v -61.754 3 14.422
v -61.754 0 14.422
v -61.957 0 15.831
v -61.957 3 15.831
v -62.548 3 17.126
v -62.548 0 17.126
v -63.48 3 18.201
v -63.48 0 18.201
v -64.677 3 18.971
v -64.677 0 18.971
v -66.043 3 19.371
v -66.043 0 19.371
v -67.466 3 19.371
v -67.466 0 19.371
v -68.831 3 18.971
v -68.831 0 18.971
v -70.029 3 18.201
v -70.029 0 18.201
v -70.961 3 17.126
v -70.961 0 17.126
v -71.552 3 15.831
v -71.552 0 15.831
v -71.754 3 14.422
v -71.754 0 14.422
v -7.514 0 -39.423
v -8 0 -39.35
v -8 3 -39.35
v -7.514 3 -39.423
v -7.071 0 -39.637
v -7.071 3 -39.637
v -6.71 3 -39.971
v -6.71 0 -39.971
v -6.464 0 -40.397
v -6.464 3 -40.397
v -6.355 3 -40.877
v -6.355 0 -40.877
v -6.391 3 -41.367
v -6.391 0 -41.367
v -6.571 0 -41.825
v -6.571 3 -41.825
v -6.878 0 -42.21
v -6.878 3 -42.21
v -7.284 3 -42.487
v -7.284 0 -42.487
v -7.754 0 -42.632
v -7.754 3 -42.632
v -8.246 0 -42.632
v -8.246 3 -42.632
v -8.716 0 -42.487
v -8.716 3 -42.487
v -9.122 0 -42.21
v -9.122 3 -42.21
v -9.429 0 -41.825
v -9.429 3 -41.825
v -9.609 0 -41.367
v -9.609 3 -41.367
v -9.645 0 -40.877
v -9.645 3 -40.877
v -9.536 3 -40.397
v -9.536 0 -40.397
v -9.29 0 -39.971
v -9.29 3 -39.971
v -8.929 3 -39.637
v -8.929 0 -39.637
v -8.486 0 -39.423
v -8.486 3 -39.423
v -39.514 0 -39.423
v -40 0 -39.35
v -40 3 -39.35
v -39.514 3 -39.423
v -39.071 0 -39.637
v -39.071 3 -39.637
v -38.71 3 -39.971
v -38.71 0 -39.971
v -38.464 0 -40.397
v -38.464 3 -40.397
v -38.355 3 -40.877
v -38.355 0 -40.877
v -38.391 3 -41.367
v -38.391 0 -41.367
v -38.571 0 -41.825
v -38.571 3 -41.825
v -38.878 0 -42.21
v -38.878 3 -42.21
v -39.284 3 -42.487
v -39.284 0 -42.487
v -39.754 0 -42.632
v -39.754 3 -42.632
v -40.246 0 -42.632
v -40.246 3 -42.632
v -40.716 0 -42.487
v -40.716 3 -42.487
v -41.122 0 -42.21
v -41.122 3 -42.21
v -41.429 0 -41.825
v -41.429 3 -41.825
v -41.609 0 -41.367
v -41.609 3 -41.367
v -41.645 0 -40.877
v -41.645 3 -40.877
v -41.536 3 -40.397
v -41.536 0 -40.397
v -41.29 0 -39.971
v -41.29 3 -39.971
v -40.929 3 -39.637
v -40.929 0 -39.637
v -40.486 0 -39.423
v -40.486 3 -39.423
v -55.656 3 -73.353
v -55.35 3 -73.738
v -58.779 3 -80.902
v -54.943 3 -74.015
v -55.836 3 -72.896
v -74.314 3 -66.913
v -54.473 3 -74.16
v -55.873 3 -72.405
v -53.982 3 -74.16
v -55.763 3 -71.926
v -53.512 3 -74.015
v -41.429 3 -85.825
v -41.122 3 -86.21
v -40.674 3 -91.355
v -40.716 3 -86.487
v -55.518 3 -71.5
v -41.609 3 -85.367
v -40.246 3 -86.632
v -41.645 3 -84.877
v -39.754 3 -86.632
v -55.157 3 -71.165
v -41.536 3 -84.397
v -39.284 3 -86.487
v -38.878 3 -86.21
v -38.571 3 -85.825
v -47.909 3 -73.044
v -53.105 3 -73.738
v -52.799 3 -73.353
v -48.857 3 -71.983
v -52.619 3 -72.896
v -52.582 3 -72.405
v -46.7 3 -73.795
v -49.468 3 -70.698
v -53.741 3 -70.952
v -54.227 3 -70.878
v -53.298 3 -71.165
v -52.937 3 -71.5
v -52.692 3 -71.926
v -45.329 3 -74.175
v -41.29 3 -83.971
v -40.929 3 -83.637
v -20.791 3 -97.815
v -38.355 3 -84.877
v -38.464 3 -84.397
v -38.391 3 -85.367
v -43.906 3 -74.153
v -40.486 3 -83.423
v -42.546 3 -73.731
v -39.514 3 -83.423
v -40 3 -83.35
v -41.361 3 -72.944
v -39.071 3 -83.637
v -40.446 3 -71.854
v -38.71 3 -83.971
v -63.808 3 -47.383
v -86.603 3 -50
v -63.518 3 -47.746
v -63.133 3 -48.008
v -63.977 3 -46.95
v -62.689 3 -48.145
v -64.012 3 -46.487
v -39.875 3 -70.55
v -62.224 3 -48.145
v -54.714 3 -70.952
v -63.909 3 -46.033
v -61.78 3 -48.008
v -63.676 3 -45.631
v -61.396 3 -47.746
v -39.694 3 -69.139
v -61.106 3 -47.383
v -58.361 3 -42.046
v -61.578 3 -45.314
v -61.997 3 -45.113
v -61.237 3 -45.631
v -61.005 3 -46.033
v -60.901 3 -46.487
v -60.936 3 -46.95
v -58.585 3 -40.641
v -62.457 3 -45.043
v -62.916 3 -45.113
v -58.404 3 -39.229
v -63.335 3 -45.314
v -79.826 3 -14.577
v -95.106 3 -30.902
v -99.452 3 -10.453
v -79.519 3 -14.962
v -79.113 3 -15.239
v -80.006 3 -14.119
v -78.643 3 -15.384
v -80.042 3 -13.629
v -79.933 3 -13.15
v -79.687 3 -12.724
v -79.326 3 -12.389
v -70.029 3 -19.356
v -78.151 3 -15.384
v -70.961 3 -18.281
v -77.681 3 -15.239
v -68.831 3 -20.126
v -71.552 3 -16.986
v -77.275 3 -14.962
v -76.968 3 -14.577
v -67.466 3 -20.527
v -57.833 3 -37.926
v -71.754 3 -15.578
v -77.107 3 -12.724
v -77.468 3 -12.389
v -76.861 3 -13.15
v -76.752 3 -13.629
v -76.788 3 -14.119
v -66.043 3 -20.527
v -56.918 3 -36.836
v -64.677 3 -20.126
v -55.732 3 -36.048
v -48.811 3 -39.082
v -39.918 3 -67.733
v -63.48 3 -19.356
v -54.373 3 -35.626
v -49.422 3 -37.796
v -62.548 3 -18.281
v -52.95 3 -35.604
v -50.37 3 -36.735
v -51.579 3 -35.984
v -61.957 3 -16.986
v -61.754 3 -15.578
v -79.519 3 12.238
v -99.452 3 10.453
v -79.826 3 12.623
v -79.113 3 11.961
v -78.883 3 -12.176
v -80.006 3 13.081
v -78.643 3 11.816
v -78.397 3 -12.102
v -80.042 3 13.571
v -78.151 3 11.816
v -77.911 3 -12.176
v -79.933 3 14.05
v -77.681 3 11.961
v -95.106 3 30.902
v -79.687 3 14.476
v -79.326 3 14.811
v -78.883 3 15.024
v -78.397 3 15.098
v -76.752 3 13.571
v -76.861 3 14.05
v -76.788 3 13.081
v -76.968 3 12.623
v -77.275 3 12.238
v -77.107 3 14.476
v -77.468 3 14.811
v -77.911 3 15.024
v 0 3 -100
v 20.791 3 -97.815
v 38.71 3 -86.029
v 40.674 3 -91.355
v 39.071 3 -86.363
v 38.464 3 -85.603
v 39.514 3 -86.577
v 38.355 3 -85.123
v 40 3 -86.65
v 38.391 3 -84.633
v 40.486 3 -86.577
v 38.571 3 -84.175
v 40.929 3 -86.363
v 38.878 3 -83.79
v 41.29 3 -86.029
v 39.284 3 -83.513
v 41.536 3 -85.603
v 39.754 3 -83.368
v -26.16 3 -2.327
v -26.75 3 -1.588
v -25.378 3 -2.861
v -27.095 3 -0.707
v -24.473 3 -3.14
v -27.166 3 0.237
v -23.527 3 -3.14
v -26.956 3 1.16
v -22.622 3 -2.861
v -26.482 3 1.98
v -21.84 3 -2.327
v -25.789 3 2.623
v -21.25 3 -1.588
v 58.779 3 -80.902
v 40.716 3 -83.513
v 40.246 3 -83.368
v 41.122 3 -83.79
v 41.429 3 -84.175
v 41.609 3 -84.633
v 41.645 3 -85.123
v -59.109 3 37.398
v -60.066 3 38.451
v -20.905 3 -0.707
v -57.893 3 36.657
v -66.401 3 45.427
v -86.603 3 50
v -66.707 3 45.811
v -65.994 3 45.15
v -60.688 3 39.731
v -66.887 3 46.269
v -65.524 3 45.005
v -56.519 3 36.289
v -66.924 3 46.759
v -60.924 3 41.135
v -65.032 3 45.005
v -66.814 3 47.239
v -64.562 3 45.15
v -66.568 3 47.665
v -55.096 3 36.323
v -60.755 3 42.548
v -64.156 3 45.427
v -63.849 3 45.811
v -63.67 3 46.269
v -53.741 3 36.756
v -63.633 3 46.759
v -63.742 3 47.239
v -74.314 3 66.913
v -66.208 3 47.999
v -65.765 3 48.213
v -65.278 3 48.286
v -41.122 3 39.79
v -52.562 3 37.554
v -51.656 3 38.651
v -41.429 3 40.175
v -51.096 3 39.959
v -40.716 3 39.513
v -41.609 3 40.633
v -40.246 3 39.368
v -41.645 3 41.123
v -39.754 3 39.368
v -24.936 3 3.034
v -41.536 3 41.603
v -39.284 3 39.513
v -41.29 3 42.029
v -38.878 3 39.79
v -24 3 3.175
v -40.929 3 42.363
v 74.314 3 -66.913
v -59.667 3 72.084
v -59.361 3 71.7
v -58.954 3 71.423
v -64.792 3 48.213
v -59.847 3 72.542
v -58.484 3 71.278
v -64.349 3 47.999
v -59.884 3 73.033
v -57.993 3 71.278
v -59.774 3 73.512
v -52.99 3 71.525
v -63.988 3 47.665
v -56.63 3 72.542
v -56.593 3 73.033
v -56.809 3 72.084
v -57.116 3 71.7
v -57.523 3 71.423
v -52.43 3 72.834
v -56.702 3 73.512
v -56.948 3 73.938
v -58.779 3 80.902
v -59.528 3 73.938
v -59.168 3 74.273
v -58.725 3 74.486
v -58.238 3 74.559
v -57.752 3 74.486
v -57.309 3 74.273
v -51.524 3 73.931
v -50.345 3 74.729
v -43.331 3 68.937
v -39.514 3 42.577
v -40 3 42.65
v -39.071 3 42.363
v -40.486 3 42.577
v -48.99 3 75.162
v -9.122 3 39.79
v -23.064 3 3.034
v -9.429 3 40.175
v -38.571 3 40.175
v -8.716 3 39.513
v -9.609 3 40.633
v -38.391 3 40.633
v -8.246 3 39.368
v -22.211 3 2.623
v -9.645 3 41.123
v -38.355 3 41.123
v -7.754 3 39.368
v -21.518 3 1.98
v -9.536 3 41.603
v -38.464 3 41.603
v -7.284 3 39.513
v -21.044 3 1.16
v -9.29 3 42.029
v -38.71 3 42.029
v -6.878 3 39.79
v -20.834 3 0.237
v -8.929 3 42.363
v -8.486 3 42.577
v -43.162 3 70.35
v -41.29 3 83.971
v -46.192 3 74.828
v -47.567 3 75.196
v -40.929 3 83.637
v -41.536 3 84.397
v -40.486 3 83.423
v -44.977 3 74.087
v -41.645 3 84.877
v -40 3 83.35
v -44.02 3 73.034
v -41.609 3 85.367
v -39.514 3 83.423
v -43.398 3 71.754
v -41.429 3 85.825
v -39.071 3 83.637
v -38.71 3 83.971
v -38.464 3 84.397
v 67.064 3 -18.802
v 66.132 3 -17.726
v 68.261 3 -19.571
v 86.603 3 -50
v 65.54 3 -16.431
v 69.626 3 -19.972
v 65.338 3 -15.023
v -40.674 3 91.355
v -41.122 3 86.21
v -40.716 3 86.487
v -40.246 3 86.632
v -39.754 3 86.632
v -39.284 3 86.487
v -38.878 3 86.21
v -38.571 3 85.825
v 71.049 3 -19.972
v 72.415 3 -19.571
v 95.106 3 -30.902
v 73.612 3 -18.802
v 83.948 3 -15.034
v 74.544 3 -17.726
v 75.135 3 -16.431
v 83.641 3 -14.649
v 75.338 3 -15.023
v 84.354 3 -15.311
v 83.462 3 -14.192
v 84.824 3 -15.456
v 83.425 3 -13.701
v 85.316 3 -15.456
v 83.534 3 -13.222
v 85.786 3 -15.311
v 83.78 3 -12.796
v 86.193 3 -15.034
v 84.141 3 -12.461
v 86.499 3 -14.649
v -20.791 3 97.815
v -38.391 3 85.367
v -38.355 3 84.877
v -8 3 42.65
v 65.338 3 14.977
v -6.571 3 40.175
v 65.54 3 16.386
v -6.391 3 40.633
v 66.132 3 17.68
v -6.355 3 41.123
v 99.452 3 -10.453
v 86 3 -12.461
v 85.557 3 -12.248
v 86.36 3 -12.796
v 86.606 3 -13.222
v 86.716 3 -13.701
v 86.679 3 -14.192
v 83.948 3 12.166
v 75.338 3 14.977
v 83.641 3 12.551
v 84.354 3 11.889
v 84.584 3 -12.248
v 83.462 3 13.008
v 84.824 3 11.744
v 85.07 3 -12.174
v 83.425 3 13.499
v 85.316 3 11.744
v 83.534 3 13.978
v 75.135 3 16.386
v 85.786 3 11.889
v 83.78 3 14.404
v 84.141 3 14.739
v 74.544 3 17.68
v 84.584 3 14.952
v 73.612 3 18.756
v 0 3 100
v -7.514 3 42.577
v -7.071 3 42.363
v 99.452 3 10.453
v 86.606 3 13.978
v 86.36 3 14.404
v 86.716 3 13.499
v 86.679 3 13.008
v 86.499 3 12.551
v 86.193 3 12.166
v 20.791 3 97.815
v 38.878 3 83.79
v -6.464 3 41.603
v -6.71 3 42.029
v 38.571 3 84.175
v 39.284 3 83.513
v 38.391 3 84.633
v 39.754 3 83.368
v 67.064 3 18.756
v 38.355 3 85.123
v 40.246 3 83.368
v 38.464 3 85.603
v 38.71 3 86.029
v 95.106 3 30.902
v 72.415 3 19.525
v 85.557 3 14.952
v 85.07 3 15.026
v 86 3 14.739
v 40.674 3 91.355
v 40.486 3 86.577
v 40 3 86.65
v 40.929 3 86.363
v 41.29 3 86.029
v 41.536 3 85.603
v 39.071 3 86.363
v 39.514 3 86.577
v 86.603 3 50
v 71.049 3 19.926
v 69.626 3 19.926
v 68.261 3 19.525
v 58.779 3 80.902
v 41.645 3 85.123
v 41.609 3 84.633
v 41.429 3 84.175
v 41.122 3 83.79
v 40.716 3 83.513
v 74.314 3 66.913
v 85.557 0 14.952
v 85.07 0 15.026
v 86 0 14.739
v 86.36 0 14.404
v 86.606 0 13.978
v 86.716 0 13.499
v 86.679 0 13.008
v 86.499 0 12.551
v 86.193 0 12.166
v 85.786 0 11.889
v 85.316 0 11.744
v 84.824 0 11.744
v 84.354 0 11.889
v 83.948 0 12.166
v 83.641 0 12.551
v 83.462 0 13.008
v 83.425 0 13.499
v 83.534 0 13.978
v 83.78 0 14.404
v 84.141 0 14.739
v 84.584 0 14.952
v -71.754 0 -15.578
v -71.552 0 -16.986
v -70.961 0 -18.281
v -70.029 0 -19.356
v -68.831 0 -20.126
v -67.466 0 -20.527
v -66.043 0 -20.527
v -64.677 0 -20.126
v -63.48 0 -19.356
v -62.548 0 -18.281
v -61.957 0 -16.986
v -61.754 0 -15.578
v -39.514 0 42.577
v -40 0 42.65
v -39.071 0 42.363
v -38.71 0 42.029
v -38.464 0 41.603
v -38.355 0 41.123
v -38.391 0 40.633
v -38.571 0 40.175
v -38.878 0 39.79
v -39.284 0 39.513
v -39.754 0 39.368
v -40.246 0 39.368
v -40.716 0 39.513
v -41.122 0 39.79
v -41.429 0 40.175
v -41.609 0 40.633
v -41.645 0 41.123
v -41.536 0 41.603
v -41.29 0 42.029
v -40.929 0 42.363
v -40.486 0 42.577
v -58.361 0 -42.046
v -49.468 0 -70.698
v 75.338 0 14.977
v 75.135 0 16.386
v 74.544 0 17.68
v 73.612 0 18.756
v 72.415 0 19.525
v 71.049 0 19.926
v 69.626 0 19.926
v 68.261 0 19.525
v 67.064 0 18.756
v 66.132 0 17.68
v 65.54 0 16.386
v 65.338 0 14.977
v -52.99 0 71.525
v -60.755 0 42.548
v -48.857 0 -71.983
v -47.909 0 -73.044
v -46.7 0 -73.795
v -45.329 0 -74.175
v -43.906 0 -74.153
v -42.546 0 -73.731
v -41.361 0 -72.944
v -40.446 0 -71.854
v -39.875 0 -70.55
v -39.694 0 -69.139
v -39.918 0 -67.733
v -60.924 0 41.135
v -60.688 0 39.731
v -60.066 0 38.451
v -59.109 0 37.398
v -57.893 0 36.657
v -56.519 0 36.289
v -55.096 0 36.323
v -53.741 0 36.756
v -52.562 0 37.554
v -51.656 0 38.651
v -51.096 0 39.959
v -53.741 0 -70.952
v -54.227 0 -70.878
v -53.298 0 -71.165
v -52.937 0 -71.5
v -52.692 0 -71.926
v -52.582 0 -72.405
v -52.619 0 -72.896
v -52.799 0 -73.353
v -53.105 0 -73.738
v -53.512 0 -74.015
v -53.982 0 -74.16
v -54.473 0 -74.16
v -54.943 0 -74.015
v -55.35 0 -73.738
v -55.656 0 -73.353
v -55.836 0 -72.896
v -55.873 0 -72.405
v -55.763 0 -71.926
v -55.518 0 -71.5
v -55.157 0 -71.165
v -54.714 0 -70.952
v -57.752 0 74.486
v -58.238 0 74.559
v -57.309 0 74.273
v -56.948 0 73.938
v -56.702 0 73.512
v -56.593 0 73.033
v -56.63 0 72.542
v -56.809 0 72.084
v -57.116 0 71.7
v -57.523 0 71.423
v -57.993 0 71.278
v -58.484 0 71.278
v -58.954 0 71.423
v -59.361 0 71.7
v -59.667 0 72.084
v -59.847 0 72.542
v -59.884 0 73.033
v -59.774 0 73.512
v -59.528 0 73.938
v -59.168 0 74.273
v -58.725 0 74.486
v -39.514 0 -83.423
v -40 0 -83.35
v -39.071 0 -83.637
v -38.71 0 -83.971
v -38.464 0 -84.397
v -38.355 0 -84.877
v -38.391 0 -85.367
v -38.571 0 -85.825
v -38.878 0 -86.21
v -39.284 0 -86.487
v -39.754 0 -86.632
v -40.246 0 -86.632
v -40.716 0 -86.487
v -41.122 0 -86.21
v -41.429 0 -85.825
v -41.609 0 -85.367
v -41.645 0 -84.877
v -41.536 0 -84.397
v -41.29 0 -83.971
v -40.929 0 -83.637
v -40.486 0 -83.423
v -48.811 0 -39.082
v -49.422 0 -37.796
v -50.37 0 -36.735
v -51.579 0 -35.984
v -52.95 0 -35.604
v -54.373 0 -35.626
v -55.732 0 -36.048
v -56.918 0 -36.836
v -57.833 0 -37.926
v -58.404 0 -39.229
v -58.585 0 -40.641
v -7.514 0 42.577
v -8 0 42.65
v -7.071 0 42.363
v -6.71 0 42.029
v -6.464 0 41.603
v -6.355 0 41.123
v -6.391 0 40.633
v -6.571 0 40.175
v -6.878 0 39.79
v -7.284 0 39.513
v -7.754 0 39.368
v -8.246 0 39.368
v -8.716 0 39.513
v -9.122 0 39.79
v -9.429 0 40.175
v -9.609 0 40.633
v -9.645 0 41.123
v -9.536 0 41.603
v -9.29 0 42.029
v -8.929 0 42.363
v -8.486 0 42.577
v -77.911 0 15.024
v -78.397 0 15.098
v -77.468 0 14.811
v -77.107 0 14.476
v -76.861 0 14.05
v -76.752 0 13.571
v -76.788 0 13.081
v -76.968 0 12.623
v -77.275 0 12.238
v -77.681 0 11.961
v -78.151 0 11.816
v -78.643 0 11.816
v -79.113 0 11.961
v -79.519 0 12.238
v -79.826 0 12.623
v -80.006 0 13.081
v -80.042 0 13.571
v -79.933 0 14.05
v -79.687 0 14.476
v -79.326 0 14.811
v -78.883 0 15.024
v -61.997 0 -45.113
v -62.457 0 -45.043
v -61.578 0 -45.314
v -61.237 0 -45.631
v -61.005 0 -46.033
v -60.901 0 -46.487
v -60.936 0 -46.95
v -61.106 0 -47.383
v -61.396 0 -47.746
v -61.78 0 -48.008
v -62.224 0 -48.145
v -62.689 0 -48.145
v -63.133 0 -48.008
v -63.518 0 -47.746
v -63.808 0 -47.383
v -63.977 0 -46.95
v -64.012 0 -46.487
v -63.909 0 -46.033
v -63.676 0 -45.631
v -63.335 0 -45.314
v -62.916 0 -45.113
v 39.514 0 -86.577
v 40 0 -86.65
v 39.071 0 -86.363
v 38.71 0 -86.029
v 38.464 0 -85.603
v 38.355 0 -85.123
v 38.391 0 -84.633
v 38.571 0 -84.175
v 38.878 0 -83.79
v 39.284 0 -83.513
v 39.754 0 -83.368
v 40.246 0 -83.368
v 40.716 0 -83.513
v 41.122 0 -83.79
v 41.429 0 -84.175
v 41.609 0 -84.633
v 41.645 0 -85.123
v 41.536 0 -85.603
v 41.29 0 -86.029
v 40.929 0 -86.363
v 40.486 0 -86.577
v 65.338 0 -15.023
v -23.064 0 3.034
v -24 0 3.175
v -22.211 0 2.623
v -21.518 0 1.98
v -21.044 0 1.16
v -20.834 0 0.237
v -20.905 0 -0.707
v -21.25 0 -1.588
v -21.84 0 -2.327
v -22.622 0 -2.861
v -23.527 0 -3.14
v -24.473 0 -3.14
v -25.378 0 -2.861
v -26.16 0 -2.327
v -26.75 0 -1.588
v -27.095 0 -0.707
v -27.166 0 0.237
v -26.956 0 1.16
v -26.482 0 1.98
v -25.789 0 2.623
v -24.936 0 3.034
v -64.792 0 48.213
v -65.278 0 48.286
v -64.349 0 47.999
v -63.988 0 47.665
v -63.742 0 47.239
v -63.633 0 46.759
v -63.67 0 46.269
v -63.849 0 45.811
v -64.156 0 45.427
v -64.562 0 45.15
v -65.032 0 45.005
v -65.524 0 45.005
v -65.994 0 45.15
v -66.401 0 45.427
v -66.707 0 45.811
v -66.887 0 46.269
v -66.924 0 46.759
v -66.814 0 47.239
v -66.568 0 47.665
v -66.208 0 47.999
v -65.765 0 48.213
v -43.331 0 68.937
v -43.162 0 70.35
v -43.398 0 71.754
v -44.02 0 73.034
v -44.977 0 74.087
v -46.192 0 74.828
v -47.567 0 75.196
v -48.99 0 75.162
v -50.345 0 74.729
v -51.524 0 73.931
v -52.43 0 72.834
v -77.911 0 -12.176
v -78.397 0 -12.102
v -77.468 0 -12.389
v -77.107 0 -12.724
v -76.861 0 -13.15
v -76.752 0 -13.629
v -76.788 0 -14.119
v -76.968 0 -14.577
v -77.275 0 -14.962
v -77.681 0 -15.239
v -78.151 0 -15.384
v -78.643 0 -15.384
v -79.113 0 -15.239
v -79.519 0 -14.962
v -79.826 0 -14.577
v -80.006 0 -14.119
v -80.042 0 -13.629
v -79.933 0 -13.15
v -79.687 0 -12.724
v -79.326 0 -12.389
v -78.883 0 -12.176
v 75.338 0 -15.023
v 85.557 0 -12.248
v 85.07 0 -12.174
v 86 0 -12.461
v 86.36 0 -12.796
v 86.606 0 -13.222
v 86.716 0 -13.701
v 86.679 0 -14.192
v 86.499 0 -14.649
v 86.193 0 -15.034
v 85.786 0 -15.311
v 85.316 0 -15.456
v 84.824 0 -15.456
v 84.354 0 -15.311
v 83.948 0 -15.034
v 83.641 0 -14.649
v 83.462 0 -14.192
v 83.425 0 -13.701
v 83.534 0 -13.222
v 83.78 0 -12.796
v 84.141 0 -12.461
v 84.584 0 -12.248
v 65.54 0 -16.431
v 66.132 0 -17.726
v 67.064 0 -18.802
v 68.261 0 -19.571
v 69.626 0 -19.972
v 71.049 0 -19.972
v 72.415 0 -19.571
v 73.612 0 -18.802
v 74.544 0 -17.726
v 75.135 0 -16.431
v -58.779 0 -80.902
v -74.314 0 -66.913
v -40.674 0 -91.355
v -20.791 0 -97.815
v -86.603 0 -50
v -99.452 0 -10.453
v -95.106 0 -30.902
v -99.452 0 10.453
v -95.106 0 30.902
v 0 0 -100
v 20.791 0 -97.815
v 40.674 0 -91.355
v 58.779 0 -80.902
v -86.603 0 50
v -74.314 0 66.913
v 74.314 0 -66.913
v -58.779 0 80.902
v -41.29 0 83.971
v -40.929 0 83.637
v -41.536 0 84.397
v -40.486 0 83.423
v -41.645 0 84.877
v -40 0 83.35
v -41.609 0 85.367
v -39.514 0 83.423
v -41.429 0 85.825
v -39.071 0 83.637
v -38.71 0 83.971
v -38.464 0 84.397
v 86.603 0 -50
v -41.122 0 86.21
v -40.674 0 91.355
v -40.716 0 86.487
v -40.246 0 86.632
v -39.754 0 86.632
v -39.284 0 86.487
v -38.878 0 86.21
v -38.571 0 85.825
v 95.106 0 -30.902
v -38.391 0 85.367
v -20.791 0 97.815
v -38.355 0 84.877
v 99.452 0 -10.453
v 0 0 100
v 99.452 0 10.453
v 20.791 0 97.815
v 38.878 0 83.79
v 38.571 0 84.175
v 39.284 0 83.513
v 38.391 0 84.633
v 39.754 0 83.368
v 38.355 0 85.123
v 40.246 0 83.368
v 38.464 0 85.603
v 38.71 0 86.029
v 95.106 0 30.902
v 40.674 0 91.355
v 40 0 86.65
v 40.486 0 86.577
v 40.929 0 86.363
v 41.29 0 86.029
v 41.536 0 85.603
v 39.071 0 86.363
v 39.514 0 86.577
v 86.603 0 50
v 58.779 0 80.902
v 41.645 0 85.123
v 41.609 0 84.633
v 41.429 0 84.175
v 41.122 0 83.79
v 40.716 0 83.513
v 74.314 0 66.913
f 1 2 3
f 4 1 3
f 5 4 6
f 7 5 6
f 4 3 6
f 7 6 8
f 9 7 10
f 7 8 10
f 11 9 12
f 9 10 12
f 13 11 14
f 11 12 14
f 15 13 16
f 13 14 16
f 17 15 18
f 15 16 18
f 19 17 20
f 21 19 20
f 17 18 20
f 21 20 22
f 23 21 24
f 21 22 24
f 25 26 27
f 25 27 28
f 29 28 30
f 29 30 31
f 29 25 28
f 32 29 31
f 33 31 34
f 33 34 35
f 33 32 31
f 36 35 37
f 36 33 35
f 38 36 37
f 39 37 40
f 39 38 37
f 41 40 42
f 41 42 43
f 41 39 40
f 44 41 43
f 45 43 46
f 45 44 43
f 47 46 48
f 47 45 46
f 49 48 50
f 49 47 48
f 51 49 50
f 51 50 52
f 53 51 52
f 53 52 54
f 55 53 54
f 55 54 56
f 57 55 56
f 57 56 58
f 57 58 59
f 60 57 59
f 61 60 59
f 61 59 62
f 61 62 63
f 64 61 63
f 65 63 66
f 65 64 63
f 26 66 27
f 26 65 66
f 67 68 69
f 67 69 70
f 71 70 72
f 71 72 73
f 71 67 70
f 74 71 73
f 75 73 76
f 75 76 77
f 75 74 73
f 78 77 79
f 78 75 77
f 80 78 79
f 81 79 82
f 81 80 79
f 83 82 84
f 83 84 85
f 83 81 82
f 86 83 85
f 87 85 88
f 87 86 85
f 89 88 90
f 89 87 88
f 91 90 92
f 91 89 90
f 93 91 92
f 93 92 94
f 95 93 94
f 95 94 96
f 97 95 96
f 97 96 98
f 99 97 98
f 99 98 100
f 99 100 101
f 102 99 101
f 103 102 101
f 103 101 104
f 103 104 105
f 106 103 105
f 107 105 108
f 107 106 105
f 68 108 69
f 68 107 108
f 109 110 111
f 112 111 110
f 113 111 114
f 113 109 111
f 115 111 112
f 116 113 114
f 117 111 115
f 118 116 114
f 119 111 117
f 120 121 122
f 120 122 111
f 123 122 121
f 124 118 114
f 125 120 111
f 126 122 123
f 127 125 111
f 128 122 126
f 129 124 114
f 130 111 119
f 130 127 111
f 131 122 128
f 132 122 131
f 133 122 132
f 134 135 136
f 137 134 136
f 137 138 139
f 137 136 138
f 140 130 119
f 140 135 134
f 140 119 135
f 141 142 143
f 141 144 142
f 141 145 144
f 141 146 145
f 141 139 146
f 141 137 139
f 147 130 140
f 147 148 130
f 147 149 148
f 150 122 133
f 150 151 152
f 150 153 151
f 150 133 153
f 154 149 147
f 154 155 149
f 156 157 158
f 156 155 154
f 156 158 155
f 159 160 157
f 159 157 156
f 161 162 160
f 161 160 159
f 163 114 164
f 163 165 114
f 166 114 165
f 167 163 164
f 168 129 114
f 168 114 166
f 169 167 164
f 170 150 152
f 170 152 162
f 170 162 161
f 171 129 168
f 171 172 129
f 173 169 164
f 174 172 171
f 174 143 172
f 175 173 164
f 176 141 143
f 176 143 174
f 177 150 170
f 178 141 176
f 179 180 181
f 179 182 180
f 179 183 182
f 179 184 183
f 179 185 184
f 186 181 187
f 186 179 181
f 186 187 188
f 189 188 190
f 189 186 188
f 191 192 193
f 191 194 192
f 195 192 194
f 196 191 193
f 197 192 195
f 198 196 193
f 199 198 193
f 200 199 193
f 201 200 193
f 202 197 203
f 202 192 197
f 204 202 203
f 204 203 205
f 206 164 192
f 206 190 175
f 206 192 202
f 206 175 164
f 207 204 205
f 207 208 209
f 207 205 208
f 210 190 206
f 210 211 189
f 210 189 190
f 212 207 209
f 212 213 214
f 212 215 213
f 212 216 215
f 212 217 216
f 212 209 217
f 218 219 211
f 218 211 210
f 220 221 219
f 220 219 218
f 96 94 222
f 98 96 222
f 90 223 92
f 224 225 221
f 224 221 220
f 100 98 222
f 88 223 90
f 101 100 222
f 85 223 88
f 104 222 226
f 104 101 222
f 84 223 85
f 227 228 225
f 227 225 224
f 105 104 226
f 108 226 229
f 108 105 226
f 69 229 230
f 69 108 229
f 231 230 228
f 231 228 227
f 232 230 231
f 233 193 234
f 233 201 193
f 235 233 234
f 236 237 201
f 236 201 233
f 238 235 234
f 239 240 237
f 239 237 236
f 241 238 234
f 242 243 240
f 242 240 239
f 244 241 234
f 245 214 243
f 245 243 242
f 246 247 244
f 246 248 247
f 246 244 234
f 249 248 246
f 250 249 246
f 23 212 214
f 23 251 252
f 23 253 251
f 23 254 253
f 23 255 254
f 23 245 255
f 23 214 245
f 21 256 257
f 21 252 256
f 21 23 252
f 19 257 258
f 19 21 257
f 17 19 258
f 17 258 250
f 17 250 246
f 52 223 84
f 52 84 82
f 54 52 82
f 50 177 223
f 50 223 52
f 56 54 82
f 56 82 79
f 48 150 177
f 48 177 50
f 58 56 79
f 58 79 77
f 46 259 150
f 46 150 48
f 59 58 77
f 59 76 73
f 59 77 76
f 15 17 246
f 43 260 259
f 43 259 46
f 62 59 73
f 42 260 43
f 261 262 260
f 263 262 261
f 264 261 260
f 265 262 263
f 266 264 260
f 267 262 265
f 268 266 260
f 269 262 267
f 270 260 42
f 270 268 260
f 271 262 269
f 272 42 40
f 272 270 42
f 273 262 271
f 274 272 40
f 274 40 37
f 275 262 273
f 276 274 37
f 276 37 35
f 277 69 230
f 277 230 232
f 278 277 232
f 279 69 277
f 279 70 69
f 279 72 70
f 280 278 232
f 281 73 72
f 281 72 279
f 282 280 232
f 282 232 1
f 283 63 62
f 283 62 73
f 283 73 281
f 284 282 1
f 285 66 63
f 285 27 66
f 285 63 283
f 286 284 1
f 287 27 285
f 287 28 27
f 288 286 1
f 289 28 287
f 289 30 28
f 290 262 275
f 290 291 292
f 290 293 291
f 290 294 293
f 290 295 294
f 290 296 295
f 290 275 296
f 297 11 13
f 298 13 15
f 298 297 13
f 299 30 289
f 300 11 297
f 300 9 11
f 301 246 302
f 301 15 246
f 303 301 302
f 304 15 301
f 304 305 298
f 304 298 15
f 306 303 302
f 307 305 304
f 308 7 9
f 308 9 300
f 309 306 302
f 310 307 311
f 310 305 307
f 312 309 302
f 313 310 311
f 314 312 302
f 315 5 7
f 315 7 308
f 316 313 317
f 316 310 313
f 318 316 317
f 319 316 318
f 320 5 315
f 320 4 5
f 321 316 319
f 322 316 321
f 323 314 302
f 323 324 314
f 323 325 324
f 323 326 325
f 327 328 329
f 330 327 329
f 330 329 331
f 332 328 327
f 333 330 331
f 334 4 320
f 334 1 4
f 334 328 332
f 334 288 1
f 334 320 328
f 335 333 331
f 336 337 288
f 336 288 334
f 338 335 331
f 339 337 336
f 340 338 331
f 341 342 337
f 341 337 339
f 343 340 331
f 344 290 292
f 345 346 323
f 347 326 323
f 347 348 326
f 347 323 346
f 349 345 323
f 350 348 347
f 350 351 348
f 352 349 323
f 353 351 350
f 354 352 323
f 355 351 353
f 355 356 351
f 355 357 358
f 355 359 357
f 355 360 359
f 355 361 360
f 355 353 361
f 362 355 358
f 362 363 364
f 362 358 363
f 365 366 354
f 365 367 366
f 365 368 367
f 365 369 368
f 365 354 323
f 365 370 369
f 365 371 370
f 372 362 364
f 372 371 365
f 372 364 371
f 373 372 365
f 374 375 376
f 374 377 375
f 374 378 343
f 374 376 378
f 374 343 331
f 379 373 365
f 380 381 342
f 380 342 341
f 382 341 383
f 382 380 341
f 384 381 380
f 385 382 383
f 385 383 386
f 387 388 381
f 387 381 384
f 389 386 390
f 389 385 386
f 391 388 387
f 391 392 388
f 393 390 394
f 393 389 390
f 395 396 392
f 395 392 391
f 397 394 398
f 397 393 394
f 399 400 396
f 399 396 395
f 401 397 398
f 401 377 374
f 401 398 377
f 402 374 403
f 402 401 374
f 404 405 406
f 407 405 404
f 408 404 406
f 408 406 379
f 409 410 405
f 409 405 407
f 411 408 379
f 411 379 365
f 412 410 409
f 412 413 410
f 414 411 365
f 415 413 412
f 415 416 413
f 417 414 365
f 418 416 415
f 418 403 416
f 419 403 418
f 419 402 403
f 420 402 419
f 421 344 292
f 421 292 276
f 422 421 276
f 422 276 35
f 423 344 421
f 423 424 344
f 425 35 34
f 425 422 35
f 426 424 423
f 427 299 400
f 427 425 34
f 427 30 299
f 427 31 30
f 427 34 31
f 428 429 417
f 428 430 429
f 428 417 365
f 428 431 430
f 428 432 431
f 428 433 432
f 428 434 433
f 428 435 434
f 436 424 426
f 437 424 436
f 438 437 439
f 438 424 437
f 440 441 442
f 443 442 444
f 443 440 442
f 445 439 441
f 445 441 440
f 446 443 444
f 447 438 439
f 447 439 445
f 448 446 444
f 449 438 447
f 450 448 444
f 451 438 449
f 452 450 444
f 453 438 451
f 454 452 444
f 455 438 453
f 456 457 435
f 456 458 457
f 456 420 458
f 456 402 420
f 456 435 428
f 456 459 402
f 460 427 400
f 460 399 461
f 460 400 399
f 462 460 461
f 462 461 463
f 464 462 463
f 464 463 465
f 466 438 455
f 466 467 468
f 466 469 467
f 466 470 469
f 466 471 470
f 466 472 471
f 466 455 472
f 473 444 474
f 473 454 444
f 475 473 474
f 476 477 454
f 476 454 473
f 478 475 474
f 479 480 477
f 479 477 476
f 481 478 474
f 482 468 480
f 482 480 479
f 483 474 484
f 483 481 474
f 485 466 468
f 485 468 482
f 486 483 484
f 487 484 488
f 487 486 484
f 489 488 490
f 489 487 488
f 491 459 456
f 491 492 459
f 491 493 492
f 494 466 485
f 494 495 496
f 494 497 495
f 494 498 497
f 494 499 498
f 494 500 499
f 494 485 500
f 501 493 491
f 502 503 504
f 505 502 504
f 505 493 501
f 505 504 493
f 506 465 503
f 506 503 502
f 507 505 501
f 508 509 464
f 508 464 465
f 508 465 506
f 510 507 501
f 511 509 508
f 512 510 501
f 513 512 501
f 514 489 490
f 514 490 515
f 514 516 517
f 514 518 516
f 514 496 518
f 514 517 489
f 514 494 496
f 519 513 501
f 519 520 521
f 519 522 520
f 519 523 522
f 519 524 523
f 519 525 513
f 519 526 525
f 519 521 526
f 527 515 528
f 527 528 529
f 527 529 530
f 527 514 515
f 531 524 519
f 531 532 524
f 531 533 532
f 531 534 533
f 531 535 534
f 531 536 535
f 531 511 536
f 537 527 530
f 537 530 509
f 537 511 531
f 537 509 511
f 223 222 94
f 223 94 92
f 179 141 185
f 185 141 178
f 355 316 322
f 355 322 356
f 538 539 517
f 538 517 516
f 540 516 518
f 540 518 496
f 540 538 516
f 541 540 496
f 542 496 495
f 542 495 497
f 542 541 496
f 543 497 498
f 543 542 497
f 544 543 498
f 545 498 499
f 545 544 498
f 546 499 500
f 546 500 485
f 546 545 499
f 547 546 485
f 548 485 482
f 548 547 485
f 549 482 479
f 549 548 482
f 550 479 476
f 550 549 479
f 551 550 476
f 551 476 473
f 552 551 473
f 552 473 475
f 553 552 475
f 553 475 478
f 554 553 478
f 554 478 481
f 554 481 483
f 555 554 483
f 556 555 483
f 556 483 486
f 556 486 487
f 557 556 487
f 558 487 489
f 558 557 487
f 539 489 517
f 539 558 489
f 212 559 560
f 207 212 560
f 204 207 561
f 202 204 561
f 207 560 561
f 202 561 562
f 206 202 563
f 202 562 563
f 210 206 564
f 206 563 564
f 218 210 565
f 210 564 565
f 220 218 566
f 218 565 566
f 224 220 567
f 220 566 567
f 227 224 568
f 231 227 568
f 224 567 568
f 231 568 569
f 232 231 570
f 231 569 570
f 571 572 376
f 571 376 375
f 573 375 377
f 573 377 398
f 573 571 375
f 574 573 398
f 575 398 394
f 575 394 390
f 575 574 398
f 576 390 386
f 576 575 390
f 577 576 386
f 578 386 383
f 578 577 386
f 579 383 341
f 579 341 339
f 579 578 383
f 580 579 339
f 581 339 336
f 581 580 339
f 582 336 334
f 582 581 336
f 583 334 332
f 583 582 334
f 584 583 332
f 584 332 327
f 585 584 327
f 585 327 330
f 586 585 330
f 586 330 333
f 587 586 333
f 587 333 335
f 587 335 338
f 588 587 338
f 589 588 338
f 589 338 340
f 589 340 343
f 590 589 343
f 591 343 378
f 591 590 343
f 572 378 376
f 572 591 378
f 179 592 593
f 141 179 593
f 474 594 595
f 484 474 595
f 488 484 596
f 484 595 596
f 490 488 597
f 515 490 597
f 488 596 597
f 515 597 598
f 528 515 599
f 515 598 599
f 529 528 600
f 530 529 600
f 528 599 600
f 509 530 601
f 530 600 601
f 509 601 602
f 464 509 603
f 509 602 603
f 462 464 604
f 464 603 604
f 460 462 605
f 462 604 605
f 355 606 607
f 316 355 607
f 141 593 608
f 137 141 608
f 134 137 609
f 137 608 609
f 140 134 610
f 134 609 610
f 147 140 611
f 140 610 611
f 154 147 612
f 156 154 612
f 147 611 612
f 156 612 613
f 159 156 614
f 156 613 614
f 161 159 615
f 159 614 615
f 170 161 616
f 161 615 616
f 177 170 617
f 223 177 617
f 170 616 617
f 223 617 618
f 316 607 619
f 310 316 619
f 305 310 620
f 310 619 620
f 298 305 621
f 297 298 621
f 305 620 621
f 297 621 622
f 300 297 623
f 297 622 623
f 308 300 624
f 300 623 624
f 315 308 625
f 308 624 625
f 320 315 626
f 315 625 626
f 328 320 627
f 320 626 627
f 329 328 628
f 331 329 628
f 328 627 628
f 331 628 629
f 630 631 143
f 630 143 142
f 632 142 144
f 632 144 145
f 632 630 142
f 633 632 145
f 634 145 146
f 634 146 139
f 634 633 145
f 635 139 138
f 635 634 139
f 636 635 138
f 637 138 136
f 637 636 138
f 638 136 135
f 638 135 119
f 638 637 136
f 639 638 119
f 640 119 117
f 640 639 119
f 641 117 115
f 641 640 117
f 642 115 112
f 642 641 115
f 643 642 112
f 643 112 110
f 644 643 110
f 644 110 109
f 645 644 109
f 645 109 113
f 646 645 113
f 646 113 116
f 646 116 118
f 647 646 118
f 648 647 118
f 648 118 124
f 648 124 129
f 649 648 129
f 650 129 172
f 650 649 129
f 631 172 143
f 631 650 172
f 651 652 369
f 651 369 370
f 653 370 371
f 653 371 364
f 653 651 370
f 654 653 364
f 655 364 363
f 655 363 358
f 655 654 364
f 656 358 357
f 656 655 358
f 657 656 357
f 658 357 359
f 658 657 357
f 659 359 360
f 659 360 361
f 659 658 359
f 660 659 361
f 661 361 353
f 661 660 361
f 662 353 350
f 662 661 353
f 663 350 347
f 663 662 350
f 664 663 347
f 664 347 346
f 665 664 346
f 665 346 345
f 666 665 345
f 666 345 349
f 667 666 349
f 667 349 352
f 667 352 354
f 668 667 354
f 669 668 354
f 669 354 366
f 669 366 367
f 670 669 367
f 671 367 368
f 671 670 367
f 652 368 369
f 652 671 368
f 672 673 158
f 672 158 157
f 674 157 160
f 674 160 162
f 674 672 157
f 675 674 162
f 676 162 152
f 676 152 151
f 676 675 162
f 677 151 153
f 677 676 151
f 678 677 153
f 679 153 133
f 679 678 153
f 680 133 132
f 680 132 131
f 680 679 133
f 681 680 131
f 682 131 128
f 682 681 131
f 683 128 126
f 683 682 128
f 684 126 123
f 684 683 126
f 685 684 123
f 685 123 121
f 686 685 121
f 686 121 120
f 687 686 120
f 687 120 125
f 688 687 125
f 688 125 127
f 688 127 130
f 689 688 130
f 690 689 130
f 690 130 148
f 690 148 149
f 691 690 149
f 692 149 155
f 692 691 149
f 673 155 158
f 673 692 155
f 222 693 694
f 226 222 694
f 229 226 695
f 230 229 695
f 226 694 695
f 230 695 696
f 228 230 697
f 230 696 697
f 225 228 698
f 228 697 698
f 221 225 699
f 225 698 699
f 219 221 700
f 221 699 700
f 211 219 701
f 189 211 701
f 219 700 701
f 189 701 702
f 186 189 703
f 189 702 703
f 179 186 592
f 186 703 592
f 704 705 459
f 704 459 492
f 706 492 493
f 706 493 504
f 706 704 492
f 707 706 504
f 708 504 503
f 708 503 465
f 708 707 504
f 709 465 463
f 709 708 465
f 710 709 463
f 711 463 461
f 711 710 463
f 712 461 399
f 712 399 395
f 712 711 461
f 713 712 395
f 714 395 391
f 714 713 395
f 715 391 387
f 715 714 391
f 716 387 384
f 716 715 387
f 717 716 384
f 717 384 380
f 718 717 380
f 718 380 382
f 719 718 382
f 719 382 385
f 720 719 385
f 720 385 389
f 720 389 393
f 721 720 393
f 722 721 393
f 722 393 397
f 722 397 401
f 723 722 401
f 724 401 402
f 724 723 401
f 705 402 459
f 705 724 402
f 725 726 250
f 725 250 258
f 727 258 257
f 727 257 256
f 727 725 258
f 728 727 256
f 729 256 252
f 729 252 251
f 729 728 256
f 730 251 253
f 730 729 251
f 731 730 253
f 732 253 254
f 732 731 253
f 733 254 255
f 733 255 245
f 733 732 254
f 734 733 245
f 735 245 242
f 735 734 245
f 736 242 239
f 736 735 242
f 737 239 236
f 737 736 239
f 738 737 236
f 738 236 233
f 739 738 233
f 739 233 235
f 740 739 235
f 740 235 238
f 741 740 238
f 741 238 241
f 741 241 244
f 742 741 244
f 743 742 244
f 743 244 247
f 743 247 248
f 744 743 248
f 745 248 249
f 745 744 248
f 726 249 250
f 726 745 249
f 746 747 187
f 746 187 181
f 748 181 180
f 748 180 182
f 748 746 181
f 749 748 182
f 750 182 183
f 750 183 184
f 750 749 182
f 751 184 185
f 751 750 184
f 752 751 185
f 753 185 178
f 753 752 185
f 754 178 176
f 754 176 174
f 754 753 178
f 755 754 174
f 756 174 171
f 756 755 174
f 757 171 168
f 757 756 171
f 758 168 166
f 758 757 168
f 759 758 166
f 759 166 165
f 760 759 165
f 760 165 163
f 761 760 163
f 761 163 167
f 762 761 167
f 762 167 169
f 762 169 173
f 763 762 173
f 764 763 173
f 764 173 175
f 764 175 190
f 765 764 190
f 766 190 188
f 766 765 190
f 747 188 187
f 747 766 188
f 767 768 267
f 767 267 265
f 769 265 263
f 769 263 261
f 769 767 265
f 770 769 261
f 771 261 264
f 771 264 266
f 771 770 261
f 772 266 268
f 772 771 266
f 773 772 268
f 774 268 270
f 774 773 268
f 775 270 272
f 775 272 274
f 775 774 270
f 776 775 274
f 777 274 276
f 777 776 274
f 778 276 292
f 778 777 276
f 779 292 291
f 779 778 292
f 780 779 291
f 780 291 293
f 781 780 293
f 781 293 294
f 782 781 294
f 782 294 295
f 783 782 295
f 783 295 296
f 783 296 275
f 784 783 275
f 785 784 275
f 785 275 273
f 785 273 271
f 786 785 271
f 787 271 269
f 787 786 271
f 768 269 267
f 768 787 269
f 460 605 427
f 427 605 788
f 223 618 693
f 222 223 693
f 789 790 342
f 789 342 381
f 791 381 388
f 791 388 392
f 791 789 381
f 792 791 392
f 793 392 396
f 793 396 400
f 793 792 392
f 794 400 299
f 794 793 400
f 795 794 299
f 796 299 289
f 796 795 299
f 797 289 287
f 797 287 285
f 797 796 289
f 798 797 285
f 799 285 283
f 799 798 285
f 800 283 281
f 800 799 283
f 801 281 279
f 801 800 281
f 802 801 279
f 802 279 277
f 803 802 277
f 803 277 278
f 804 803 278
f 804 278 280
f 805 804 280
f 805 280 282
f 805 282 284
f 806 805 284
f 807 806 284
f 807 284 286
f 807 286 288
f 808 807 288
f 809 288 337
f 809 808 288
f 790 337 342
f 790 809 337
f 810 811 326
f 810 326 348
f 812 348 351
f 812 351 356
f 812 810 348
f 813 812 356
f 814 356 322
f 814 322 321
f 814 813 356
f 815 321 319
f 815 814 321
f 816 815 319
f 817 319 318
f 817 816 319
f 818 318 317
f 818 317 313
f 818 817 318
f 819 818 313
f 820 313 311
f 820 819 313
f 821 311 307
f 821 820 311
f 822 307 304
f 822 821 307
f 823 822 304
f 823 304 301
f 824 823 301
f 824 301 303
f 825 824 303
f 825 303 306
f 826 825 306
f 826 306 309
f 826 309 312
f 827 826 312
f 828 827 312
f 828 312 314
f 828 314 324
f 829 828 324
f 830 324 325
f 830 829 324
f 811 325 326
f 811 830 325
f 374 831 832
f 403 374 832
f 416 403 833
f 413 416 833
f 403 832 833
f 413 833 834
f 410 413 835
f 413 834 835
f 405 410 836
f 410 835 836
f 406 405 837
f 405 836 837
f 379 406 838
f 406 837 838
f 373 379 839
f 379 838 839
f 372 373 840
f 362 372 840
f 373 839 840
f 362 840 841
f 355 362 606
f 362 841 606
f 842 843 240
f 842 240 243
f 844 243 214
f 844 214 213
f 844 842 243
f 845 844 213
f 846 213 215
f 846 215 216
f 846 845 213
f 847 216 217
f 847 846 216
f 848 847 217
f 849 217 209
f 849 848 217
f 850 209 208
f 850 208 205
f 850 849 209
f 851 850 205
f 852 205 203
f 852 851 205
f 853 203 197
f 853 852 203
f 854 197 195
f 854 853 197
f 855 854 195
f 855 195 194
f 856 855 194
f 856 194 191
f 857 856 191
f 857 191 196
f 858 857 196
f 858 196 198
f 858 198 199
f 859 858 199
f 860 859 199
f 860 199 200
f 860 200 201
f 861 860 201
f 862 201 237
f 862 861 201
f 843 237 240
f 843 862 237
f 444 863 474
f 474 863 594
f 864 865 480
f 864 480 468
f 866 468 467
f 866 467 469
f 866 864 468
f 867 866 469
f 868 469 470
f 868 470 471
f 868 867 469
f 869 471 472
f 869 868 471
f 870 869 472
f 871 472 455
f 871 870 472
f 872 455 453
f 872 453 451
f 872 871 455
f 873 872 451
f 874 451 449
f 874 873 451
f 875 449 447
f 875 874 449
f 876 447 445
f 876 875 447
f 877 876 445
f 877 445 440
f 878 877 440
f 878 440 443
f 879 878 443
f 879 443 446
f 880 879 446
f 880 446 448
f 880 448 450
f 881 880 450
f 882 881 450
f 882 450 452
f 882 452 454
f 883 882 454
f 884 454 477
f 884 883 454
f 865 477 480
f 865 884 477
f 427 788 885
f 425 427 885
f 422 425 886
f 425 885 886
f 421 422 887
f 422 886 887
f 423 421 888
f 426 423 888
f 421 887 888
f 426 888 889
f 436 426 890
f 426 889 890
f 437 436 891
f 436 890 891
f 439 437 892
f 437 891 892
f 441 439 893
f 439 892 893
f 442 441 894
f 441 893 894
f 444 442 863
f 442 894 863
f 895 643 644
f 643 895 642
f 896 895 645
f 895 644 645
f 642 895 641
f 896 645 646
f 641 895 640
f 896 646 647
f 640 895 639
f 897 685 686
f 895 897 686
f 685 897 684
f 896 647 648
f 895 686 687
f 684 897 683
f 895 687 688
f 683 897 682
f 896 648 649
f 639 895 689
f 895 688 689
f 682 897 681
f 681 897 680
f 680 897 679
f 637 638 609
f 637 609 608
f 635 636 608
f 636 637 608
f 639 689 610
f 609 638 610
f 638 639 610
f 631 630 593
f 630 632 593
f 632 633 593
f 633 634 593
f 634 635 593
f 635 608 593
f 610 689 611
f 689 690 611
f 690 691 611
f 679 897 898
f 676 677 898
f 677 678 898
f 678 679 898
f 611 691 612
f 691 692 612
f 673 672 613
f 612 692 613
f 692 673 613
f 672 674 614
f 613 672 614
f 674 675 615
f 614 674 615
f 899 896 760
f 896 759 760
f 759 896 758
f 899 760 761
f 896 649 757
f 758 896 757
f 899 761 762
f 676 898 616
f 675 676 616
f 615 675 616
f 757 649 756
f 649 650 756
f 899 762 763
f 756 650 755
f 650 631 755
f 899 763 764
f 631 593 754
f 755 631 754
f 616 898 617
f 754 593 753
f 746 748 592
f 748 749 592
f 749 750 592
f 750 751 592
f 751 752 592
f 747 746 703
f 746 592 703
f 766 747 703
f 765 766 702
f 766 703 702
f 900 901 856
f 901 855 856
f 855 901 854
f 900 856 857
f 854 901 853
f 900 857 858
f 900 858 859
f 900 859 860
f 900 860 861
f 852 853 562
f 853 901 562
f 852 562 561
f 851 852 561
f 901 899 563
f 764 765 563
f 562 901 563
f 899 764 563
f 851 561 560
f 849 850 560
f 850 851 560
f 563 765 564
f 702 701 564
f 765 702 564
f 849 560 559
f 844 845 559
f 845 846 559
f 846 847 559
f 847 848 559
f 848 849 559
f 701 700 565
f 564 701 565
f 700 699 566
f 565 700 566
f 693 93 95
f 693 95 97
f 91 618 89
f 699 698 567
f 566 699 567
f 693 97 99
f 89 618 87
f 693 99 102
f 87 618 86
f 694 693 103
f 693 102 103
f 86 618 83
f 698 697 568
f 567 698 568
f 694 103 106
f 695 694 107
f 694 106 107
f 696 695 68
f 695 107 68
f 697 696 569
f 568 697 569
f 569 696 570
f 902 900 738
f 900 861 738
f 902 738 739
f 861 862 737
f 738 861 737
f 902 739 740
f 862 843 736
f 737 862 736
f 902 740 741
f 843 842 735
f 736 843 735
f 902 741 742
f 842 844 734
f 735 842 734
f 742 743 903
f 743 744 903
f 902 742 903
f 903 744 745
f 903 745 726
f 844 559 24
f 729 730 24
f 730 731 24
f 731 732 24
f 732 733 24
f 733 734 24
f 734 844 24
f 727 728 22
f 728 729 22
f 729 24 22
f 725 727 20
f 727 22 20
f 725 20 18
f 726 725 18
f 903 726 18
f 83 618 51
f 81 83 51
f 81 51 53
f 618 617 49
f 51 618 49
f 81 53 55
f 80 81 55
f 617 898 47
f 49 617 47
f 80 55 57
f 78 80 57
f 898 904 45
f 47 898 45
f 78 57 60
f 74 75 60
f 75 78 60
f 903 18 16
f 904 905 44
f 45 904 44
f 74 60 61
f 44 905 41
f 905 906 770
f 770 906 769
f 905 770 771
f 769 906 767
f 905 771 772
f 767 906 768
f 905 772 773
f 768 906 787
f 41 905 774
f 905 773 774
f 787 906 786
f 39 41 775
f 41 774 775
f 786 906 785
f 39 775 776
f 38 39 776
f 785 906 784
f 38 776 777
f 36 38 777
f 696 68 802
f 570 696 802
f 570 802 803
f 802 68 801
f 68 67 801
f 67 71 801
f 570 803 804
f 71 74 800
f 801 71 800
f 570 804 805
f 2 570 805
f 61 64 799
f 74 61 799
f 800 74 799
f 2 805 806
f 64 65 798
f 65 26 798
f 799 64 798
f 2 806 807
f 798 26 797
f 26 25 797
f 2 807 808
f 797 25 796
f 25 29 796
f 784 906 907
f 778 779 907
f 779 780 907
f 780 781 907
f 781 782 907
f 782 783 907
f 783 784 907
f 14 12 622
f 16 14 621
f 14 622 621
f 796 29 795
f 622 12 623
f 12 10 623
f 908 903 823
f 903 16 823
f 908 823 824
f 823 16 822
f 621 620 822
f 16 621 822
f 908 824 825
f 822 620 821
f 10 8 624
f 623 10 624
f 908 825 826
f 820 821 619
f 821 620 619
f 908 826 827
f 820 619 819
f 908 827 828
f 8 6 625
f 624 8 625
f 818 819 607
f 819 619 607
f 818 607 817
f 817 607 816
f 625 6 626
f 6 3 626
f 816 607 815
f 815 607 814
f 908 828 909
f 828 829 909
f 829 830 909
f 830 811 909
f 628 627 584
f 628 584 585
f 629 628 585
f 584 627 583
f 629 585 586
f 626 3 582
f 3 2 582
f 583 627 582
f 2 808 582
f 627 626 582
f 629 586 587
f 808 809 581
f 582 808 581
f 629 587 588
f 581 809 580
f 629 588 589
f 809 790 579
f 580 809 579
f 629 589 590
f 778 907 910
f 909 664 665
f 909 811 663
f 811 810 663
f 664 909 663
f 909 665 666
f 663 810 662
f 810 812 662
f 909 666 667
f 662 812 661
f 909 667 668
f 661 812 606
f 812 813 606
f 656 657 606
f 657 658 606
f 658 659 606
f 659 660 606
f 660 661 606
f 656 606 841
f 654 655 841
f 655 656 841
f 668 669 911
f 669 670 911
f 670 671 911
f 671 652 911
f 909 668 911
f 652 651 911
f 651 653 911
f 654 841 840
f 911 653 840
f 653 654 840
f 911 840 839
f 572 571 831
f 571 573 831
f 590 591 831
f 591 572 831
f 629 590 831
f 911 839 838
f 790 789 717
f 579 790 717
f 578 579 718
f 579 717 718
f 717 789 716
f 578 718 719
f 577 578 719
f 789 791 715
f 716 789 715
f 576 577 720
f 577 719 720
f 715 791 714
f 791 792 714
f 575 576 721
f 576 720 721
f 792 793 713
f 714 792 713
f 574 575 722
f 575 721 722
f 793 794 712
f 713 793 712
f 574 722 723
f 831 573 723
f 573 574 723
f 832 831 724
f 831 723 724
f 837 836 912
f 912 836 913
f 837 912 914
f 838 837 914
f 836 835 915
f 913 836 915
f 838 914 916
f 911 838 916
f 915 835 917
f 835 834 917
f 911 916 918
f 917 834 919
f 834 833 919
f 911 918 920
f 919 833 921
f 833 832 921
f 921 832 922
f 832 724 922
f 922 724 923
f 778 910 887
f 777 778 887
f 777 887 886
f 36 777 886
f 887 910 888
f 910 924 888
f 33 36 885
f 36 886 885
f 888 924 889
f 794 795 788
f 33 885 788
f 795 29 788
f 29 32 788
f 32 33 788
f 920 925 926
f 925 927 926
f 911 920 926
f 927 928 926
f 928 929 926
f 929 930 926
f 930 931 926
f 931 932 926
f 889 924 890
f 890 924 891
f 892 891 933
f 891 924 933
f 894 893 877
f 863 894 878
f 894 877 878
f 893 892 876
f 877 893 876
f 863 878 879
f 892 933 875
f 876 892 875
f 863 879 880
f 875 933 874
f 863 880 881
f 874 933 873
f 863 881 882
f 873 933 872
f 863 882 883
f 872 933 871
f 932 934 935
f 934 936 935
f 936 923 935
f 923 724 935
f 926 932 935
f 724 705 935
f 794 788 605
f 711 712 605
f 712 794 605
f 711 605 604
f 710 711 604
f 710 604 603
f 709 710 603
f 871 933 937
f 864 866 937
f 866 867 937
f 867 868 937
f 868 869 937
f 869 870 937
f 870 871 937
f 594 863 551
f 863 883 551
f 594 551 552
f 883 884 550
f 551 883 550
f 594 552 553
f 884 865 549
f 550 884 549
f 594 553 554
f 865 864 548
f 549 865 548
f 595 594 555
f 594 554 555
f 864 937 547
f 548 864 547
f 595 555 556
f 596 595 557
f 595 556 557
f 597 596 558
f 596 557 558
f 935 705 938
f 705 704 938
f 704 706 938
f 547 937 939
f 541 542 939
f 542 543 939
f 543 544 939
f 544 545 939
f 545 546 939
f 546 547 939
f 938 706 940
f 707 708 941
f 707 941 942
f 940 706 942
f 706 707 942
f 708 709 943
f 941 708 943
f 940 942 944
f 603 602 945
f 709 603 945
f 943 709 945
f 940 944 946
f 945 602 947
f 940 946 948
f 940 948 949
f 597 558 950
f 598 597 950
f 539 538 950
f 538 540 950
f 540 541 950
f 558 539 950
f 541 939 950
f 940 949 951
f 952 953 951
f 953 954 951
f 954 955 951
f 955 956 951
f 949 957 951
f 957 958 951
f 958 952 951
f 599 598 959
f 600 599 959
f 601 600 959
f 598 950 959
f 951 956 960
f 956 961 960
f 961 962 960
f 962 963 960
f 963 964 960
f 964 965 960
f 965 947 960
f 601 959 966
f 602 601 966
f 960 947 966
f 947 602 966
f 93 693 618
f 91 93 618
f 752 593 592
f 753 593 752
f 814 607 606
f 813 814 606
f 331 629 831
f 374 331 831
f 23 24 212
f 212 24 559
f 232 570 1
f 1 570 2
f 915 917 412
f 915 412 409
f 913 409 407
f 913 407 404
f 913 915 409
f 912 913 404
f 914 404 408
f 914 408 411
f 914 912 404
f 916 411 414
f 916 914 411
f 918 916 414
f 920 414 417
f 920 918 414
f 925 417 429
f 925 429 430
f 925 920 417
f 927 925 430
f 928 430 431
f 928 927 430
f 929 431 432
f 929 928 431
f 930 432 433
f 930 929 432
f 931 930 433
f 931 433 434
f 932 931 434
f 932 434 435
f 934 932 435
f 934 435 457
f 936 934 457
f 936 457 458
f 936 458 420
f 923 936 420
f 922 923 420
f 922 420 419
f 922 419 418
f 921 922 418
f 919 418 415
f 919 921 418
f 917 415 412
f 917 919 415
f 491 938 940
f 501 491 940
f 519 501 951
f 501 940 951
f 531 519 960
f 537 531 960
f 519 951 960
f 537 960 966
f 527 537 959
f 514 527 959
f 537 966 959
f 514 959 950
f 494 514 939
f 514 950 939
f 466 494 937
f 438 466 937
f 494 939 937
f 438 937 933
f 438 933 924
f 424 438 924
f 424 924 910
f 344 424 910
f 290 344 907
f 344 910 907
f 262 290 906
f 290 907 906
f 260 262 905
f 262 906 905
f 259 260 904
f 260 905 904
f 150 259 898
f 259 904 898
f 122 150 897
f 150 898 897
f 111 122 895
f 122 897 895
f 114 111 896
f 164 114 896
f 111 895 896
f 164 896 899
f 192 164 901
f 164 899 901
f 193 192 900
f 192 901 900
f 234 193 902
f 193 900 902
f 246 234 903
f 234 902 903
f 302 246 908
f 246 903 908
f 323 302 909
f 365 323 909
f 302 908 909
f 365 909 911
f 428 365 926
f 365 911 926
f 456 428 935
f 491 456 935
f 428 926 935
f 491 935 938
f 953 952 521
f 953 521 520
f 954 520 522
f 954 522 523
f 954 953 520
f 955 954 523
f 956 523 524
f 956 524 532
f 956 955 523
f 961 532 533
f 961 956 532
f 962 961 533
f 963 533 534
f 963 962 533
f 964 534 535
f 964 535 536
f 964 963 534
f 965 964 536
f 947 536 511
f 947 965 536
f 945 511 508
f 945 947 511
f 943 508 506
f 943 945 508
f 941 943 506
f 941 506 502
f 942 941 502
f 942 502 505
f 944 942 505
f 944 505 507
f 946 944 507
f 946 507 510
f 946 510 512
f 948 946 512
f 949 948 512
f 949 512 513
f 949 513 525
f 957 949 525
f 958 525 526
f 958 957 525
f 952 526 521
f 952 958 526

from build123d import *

# Parameters (mm, degrees)
CROQUIS1_R              = 100
CROQUIS1_R_2            = 1.65
CROQUIS1_R_3            = 3.175
CROQUIS1_R_4            = 1.559752628
SALIENTE_EXTRUIR1_DEPTH = 3


with BuildPart() as part:
    # Croquis1 → Saliente-Extruir1 (new body)
    with BuildSketch(Plane(origin=(0, 0, 0), x_dir=(1, 0, 0), z_dir=(0, 1, 0))):
        with Locations(Location((0, 0, 0), (0, 0, 270))):
            Circle(CROQUIS1_R)
        with Locations(Location((40, -85, 0), (0, 0, 270))):
            Circle(CROQUIS1_R_2, mode=Mode.SUBTRACT)
        with Locations(Location((40, 85, 0), (0, 0, 90))):
            Circle(CROQUIS1_R_2, mode=Mode.SUBTRACT)
        with Locations(Location((-40, -85, 0), (0, 0, 90))):
            Circle(CROQUIS1_R_2, mode=Mode.SUBTRACT)
        with Locations(Location((-40, 85, 0), (0, 0, 270))):
            Circle(CROQUIS1_R_2, mode=Mode.SUBTRACT)
        with Locations(Location((-40, 41, 0), (0, 0, 270))):
            Circle(CROQUIS1_R_2, mode=Mode.SUBTRACT)
        with Locations(Location((-40, -41, 0), (0, 0, 270))):
            Circle(CROQUIS1_R_2, mode=Mode.SUBTRACT)
        with Locations(Location((-24, 0, 0), (0, 0, 270))):
            Circle(CROQUIS1_R_3, mode=Mode.SUBTRACT)
        with Locations(Location((-8, 41, 0), (0, 0, 270))):
            Circle(CROQUIS1_R_2, mode=Mode.SUBTRACT)
        with Locations(Location((-8, -41, 0), (0, 0, 270))):
            Circle(CROQUIS1_R_2, mode=Mode.SUBTRACT)
        with Locations(Location((85.070235004, 13.824441517, 0), (0, 0, 270))):
            Circle(CROQUIS1_R_2, mode=Mode.SUBTRACT)
        with Locations(Location((85.070235004, -13.375558483, 0), (0, 0, 270))):
            Circle(CROQUIS1_R_2, mode=Mode.SUBTRACT)
        with Locations(Location((-54.227480628, 72.528357265, 0), (0, 0, 270))):
            Circle(CROQUIS1_R_2, mode=Mode.SUBTRACT)
        with Locations(Location((-62.456735614, 46.603092322, 0), (0, 0, 270))):
            Circle(CROQUIS1_R_4, mode=Mode.SUBTRACT)
        with Locations(Location((-78.396993978, 13.752324836, 0), (0, 0, 270))):
            Circle(CROQUIS1_R_2, mode=Mode.SUBTRACT)
        with Locations(Location((-78.396993978, -13.447675164, 0), (0, 0, 270))):
            Circle(CROQUIS1_R_2, mode=Mode.SUBTRACT)
        with Locations(Location((-65.278300678, -46.636121303, 0), (0, 0, 270))):
            Circle(CROQUIS1_R_2, mode=Mode.SUBTRACT)
        with Locations(Location((-58.238422651, -72.909303778, 0), (0, 0, 270))):
            Circle(CROQUIS1_R_2, mode=Mode.SUBTRACT)
        with BuildLine():
            Line((-51.095611493, -39.959459006), (-43.33104014, -68.937233795))
            ThreePointArc((-43.33104014, -68.937233795), (-46.866574046, -75.060958152), (-52.990298403, -71.525424246))
            Line((-52.990298403, -71.525424246), (-60.754869756, -42.547649457))
            ThreePointArc((-60.754869756, -42.547649457), (-57.21933585, -36.4239251), (-51.095611493, -39.959459006))
        make_face(mode=Mode.SUBTRACT)
        with BuildLine():
            Line((-61.754274717, 15.577653458), (-61.754274717, -14.422346542))
            ThreePointArc((-61.754274717, -14.422346542), (-66.754274717, -19.422346542), (-71.754274717, -14.422346542))
            Line((-71.754274717, -14.422346542), (-71.754274717, 15.577653458))
            ThreePointArc((-71.754274717, 15.577653458), (-66.754274717, 20.577653458), (-61.754274717, 15.577653458))
        make_face(mode=Mode.SUBTRACT)
        with BuildLine():
            Line((-39.917801293, 67.733415285), (-48.810516369, 39.081720421))
            ThreePointArc((-48.810516369, 39.081720421), (-55.067918025, 35.788557123), (-58.361081323, 42.04595878))
            Line((-58.361081323, 42.04595878), (-49.468366247, 70.697653644))
            ThreePointArc((-49.468366247, 70.697653644), (-43.210964591, 73.990816942), (-39.917801293, 67.733415285))
        make_face(mode=Mode.SUBTRACT)
        with BuildLine():
            Line((75.337806397, 15.02279383), (75.337806397, -14.97720617))
            ThreePointArc((75.337806397, -14.97720617), (70.337806397, -19.97720617), (65.337806397, -14.97720617))
            Line((65.337806397, -14.97720617), (65.337806397, 15.02279383))
            ThreePointArc((65.337806397, 15.02279383), (70.337806397, 20.02279383), (75.337806397, 15.02279383))
        make_face(mode=Mode.SUBTRACT)
    extrude(amount=SALIENTE_EXTRUIR1_DEPTH)


solid = part.part
